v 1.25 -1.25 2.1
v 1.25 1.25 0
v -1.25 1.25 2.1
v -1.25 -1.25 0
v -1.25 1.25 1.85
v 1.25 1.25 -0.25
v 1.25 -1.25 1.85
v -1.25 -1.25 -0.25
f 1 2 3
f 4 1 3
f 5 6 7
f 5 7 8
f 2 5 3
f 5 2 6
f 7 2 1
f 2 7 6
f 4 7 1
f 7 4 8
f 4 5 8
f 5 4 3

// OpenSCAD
// file: lib/lodge_kit.scad
// Lodge shell tile kit — shared dimensions and modules.
//
// The game paints a lodge footprint in 5 m cells and resolves the
// exterior from these tiles at half-cell (2.5 m) resolution; see
// internal/world/lodge_shell.go. Every tile is authored in the same
// canonical frame:
//
//   * origin on the lodge floor plane (Z = 0);
//   * wall-type tiles sit on a footprint edge, centred on it, with the
//     OUTSIDE toward SCAD −Y (game +Z) and the wall thickness toward +Y;
//   * roof tiles are centred on a half-cell, with Z = 0 at the tile's
//     lowest corner; slopes fall toward −Y (game +Z);
//   * corner tiles sit on a grid vertex; an outer corner's building is
//     in the SCAD (−X, +Y) quadrant, an inner corner's notch in (+X, −Y).
//
// Colours are near-neutral: the renderer tints walls and roofs per lodge
// from a seeded palette (world.ShellPalette).
//
// Keep these in sync with the constants in lodge_shell.go.

tile   = 2.5;   // ShellTileSize
wall_h = 5.0;   // ShellWallHeight
rise   = 2.1;   // ShellRoofRise, per tile of run
pitch  = rise / tile;

wall_t   = 0.35;  // wall thickness
sink     = 1.5;   // walls run this far below the floor to hide pad grading
roof_t   = 0.25;  // roof slab thickness
overhang = 0.7;   // eaves overhang past the wall plane

c_wall   = [0.92, 0.90, 0.86];
c_stone  = [0.62, 0.61, 0.60];
c_trim   = [0.97, 0.97, 0.95];
c_glass  = [0.30, 0.42, 0.52];
c_door   = [0.36, 0.25, 0.18];
c_roof   = [0.97, 0.97, 0.97];
c_fascia = [0.55, 0.52, 0.50];

// Plain wall panel: timber above a stone plinth, a trim band under the
// eaves.
module wall_panel() {
    color(c_wall)
        translate([-tile/2, 0, -sink]) cube([tile, wall_t, wall_h + sink]);
    color(c_stone)
        translate([-tile/2, -0.06, -sink]) cube([tile, wall_t, sink + 0.7]);
    color(c_trim)
        translate([-tile/2, -0.04, wall_h - 0.3]) cube([tile, 0.1, 0.3]);
    battens();
}

// Horizontal board lines above the plinth.
module battens() {
    color(c_wall * 0.8)
        for (z = [1.3 : 0.6 : wall_h - 0.6])
            translate([-tile/2, -0.03, z]) cube([tile, 0.04, 0.06]);
}

// A framed pane on the outer face. x0/w along the wall, z0/h up it.
module pane(x0, w, z0, h) {
    color(c_trim)
        translate([x0 - 0.1, -0.05, z0 - 0.1]) cube([w + 0.2, 0.06, h + 0.2]);
    color(c_glass)
        translate([x0, -0.08, z0]) cube([w, 0.06, h]);
}

module wall_window() {
    wall_panel();
    pane(-0.7, 1.4, 1.4, 2.2);
    color(c_trim) translate([-0.02, -0.1, 1.4]) cube([0.04, 0.04, 2.2]); // mullion
}

// Tall window flanked by shutters.
module wall_window_alt() {
    wall_panel();
    pane(-0.5, 1.0, 1.2, 2.8);
    color(c_door) {
        translate([-1.0, -0.1, 1.2]) cube([0.4, 0.05, 2.8]);
        translate([ 0.6, -0.1, 1.2]) cube([0.4, 0.05, 2.8]);
    }
}

// Floor-to-eave glazing for food courts: a low stone sill, then glass in
// three lights.
module wall_glazed() {
    color(c_wall)
        translate([-tile/2, 0, -sink]) cube([tile, wall_t, wall_h + sink]);
    color(c_stone)
        translate([-tile/2, -0.06, -sink]) cube([tile, wall_t, sink + 0.35]);
    color(c_glass)
        translate([-tile/2, -0.09, 0.35]) cube([tile, 0.06, wall_h - 0.75]);
    color(c_trim) {
        for (x = [-tile/2, -tile/6, tile/6, tile/2 - 0.08])
            translate([x, -0.12, 0.35]) cube([0.08, 0.06, wall_h - 0.75]);
        translate([-tile/2, -0.12, wall_h - 0.45]) cube([tile, 0.07, 0.1]);
    }
}

// Glazed entry door under a small canopy, with a step.
module door() {
    color(c_wall)
        translate([-tile/2, 0, -sink]) cube([tile, wall_t, wall_h + sink]);
    color(c_stone)
        translate([-tile/2, -0.06, -sink]) cube([tile, wall_t, sink + 0.15]);
    battens();
    color(c_door)
        translate([-0.9, -0.1, 0]) cube([1.8, 0.1, 2.7]);
    color(c_glass) {
        translate([-0.75, -0.13, 0.9]) cube([0.65, 0.05, 1.6]);
        translate([ 0.10, -0.13, 0.9]) cube([0.65, 0.05, 1.6]);
    }
    color(c_trim)
        translate([-tile/2, -0.04, wall_h - 0.3]) cube([tile, 0.1, 0.3]);
    color(c_roof)   // canopy
        translate([-1.2, -1.3, 3.0])
            rotate([-12, 0, 0]) cube([2.4, 1.3, 0.12]);
    color(c_stone)  // step
        translate([-1.1, -0.9, -0.3]) cube([2.2, 0.9, 0.42]);
}

module corner_outer() {
    color(c_stone)
        translate([-0.3, -0.05, -sink]) cube([0.35, 0.35, wall_h + sink - 0.3]);
}

module corner_inner() {
    color(c_trim)
        translate([0, -0.12, 0]) cube([0.12, 0.12, wall_h - 0.3]);
}

// Roof slab over one half-cell. h lists corner heights (in rise units)
// in SCAD order (−X,+Y), (+X,+Y), (+X,−Y), (−X,−Y); split names which
// diagonal the top surface folds along: 0 through corners 0–2, 1
// through corners 1–3.
module roof_tile(h, split) {
    p = [[-tile/2, tile/2], [tile/2, tile/2], [tile/2, -tile/2], [-tile/2, -tile/2]];
    top = [for (i = [0:3]) [p[i][0], p[i][1], h[i] * rise]];
    bot = [for (i = [0:3]) [p[i][0], p[i][1], h[i] * rise - roof_t]];
    tris = split == 0 ? [[0, 1, 2], [0, 2, 3]] : [[0, 1, 3], [1, 2, 3]];
    color(c_roof)
        polyhedron(
            points = concat(top, bot),
            faces = concat(
                // top (clockwise seen from above = outward in OpenSCAD)
                [for (t = tris) [t[0], t[1], t[2]]],
                [for (t = tris) [t[2] + 4, t[1] + 4, t[0] + 4]],
                [for (i = [0:3]) [i, i + 4, (i + 1) % 4 + 4, (i + 1) % 4]]
            ));
}

// Eaves strip past a wall edge: continues the roof plane outward and
// down, finished with a fascia board.
module eave() {
    drop = overhang * pitch;
    color(c_roof)
        polyhedron(
            points = [
                [-tile/2, 0, 0], [tile/2, 0, 0], [tile/2, -overhang, -drop], [-tile/2, -overhang, -drop],
                [-tile/2, 0, -roof_t], [tile/2, 0, -roof_t], [tile/2, -overhang, -drop - roof_t], [-tile/2, -overhang, -drop - roof_t],
            ],
            faces = [[0, 1, 2, 3], [7, 6, 5, 4], [0, 4, 5, 1], [1, 5, 6, 2], [2, 6, 7, 3], [3, 7, 4, 0]]);
    color(c_fascia)
        translate([-tile/2, -overhang - 0.05, -drop - roof_t - 0.1]) cube([tile, 0.08, roof_t + 0.2]);
}

// Eaves in the square past an outer corner: a hip folding along the
// diagonal away from the building.
module eave_corner() {
    o = overhang;
    d = o * pitch;
    color(c_roof)
        polyhedron(
            points = [
                [0, 0, 0], [o, 0, -d], [o, -o, -d], [0, -o, -d],
                [0, 0, -roof_t], [o, 0, -d - roof_t], [o, -o, -d - roof_t], [0, -o, -d - roof_t],
            ],
            faces = [[0, 1, 2], [0, 2, 3], [6, 5, 4], [7, 6, 4], [0, 4, 5, 1], [1, 5, 6, 2], [2, 6, 7, 3], [3, 7, 4, 0]]);
    color(c_fascia) {
        translate([0, -o - 0.05, -d - roof_t - 0.1]) cube([o + 0.05, 0.08, roof_t + 0.2]);
        translate([o - 0.03, -o - 0.05, -d - roof_t - 0.1]) cube([0.08, o + 0.05, roof_t + 0.2]);
    }
}

module chimney() {
    color(c_stone)
        translate([-0.55, -0.55, -1.0]) cube([1.1, 1.1, rise + 3.0]);
    color(c_fascia)
        translate([-0.65, -0.65, rise + 1.8]) cube([1.3, 1.3, 0.2]);
}
// main file
// Lodge shell kit: saddle, ridged along the (−X, +Y)–(+X, −Y) diagonal. See lib/lodge_kit.scad.
include <lib/lodge_kit.scad>
roof_tile([1, 0, 1, 0], 0);
